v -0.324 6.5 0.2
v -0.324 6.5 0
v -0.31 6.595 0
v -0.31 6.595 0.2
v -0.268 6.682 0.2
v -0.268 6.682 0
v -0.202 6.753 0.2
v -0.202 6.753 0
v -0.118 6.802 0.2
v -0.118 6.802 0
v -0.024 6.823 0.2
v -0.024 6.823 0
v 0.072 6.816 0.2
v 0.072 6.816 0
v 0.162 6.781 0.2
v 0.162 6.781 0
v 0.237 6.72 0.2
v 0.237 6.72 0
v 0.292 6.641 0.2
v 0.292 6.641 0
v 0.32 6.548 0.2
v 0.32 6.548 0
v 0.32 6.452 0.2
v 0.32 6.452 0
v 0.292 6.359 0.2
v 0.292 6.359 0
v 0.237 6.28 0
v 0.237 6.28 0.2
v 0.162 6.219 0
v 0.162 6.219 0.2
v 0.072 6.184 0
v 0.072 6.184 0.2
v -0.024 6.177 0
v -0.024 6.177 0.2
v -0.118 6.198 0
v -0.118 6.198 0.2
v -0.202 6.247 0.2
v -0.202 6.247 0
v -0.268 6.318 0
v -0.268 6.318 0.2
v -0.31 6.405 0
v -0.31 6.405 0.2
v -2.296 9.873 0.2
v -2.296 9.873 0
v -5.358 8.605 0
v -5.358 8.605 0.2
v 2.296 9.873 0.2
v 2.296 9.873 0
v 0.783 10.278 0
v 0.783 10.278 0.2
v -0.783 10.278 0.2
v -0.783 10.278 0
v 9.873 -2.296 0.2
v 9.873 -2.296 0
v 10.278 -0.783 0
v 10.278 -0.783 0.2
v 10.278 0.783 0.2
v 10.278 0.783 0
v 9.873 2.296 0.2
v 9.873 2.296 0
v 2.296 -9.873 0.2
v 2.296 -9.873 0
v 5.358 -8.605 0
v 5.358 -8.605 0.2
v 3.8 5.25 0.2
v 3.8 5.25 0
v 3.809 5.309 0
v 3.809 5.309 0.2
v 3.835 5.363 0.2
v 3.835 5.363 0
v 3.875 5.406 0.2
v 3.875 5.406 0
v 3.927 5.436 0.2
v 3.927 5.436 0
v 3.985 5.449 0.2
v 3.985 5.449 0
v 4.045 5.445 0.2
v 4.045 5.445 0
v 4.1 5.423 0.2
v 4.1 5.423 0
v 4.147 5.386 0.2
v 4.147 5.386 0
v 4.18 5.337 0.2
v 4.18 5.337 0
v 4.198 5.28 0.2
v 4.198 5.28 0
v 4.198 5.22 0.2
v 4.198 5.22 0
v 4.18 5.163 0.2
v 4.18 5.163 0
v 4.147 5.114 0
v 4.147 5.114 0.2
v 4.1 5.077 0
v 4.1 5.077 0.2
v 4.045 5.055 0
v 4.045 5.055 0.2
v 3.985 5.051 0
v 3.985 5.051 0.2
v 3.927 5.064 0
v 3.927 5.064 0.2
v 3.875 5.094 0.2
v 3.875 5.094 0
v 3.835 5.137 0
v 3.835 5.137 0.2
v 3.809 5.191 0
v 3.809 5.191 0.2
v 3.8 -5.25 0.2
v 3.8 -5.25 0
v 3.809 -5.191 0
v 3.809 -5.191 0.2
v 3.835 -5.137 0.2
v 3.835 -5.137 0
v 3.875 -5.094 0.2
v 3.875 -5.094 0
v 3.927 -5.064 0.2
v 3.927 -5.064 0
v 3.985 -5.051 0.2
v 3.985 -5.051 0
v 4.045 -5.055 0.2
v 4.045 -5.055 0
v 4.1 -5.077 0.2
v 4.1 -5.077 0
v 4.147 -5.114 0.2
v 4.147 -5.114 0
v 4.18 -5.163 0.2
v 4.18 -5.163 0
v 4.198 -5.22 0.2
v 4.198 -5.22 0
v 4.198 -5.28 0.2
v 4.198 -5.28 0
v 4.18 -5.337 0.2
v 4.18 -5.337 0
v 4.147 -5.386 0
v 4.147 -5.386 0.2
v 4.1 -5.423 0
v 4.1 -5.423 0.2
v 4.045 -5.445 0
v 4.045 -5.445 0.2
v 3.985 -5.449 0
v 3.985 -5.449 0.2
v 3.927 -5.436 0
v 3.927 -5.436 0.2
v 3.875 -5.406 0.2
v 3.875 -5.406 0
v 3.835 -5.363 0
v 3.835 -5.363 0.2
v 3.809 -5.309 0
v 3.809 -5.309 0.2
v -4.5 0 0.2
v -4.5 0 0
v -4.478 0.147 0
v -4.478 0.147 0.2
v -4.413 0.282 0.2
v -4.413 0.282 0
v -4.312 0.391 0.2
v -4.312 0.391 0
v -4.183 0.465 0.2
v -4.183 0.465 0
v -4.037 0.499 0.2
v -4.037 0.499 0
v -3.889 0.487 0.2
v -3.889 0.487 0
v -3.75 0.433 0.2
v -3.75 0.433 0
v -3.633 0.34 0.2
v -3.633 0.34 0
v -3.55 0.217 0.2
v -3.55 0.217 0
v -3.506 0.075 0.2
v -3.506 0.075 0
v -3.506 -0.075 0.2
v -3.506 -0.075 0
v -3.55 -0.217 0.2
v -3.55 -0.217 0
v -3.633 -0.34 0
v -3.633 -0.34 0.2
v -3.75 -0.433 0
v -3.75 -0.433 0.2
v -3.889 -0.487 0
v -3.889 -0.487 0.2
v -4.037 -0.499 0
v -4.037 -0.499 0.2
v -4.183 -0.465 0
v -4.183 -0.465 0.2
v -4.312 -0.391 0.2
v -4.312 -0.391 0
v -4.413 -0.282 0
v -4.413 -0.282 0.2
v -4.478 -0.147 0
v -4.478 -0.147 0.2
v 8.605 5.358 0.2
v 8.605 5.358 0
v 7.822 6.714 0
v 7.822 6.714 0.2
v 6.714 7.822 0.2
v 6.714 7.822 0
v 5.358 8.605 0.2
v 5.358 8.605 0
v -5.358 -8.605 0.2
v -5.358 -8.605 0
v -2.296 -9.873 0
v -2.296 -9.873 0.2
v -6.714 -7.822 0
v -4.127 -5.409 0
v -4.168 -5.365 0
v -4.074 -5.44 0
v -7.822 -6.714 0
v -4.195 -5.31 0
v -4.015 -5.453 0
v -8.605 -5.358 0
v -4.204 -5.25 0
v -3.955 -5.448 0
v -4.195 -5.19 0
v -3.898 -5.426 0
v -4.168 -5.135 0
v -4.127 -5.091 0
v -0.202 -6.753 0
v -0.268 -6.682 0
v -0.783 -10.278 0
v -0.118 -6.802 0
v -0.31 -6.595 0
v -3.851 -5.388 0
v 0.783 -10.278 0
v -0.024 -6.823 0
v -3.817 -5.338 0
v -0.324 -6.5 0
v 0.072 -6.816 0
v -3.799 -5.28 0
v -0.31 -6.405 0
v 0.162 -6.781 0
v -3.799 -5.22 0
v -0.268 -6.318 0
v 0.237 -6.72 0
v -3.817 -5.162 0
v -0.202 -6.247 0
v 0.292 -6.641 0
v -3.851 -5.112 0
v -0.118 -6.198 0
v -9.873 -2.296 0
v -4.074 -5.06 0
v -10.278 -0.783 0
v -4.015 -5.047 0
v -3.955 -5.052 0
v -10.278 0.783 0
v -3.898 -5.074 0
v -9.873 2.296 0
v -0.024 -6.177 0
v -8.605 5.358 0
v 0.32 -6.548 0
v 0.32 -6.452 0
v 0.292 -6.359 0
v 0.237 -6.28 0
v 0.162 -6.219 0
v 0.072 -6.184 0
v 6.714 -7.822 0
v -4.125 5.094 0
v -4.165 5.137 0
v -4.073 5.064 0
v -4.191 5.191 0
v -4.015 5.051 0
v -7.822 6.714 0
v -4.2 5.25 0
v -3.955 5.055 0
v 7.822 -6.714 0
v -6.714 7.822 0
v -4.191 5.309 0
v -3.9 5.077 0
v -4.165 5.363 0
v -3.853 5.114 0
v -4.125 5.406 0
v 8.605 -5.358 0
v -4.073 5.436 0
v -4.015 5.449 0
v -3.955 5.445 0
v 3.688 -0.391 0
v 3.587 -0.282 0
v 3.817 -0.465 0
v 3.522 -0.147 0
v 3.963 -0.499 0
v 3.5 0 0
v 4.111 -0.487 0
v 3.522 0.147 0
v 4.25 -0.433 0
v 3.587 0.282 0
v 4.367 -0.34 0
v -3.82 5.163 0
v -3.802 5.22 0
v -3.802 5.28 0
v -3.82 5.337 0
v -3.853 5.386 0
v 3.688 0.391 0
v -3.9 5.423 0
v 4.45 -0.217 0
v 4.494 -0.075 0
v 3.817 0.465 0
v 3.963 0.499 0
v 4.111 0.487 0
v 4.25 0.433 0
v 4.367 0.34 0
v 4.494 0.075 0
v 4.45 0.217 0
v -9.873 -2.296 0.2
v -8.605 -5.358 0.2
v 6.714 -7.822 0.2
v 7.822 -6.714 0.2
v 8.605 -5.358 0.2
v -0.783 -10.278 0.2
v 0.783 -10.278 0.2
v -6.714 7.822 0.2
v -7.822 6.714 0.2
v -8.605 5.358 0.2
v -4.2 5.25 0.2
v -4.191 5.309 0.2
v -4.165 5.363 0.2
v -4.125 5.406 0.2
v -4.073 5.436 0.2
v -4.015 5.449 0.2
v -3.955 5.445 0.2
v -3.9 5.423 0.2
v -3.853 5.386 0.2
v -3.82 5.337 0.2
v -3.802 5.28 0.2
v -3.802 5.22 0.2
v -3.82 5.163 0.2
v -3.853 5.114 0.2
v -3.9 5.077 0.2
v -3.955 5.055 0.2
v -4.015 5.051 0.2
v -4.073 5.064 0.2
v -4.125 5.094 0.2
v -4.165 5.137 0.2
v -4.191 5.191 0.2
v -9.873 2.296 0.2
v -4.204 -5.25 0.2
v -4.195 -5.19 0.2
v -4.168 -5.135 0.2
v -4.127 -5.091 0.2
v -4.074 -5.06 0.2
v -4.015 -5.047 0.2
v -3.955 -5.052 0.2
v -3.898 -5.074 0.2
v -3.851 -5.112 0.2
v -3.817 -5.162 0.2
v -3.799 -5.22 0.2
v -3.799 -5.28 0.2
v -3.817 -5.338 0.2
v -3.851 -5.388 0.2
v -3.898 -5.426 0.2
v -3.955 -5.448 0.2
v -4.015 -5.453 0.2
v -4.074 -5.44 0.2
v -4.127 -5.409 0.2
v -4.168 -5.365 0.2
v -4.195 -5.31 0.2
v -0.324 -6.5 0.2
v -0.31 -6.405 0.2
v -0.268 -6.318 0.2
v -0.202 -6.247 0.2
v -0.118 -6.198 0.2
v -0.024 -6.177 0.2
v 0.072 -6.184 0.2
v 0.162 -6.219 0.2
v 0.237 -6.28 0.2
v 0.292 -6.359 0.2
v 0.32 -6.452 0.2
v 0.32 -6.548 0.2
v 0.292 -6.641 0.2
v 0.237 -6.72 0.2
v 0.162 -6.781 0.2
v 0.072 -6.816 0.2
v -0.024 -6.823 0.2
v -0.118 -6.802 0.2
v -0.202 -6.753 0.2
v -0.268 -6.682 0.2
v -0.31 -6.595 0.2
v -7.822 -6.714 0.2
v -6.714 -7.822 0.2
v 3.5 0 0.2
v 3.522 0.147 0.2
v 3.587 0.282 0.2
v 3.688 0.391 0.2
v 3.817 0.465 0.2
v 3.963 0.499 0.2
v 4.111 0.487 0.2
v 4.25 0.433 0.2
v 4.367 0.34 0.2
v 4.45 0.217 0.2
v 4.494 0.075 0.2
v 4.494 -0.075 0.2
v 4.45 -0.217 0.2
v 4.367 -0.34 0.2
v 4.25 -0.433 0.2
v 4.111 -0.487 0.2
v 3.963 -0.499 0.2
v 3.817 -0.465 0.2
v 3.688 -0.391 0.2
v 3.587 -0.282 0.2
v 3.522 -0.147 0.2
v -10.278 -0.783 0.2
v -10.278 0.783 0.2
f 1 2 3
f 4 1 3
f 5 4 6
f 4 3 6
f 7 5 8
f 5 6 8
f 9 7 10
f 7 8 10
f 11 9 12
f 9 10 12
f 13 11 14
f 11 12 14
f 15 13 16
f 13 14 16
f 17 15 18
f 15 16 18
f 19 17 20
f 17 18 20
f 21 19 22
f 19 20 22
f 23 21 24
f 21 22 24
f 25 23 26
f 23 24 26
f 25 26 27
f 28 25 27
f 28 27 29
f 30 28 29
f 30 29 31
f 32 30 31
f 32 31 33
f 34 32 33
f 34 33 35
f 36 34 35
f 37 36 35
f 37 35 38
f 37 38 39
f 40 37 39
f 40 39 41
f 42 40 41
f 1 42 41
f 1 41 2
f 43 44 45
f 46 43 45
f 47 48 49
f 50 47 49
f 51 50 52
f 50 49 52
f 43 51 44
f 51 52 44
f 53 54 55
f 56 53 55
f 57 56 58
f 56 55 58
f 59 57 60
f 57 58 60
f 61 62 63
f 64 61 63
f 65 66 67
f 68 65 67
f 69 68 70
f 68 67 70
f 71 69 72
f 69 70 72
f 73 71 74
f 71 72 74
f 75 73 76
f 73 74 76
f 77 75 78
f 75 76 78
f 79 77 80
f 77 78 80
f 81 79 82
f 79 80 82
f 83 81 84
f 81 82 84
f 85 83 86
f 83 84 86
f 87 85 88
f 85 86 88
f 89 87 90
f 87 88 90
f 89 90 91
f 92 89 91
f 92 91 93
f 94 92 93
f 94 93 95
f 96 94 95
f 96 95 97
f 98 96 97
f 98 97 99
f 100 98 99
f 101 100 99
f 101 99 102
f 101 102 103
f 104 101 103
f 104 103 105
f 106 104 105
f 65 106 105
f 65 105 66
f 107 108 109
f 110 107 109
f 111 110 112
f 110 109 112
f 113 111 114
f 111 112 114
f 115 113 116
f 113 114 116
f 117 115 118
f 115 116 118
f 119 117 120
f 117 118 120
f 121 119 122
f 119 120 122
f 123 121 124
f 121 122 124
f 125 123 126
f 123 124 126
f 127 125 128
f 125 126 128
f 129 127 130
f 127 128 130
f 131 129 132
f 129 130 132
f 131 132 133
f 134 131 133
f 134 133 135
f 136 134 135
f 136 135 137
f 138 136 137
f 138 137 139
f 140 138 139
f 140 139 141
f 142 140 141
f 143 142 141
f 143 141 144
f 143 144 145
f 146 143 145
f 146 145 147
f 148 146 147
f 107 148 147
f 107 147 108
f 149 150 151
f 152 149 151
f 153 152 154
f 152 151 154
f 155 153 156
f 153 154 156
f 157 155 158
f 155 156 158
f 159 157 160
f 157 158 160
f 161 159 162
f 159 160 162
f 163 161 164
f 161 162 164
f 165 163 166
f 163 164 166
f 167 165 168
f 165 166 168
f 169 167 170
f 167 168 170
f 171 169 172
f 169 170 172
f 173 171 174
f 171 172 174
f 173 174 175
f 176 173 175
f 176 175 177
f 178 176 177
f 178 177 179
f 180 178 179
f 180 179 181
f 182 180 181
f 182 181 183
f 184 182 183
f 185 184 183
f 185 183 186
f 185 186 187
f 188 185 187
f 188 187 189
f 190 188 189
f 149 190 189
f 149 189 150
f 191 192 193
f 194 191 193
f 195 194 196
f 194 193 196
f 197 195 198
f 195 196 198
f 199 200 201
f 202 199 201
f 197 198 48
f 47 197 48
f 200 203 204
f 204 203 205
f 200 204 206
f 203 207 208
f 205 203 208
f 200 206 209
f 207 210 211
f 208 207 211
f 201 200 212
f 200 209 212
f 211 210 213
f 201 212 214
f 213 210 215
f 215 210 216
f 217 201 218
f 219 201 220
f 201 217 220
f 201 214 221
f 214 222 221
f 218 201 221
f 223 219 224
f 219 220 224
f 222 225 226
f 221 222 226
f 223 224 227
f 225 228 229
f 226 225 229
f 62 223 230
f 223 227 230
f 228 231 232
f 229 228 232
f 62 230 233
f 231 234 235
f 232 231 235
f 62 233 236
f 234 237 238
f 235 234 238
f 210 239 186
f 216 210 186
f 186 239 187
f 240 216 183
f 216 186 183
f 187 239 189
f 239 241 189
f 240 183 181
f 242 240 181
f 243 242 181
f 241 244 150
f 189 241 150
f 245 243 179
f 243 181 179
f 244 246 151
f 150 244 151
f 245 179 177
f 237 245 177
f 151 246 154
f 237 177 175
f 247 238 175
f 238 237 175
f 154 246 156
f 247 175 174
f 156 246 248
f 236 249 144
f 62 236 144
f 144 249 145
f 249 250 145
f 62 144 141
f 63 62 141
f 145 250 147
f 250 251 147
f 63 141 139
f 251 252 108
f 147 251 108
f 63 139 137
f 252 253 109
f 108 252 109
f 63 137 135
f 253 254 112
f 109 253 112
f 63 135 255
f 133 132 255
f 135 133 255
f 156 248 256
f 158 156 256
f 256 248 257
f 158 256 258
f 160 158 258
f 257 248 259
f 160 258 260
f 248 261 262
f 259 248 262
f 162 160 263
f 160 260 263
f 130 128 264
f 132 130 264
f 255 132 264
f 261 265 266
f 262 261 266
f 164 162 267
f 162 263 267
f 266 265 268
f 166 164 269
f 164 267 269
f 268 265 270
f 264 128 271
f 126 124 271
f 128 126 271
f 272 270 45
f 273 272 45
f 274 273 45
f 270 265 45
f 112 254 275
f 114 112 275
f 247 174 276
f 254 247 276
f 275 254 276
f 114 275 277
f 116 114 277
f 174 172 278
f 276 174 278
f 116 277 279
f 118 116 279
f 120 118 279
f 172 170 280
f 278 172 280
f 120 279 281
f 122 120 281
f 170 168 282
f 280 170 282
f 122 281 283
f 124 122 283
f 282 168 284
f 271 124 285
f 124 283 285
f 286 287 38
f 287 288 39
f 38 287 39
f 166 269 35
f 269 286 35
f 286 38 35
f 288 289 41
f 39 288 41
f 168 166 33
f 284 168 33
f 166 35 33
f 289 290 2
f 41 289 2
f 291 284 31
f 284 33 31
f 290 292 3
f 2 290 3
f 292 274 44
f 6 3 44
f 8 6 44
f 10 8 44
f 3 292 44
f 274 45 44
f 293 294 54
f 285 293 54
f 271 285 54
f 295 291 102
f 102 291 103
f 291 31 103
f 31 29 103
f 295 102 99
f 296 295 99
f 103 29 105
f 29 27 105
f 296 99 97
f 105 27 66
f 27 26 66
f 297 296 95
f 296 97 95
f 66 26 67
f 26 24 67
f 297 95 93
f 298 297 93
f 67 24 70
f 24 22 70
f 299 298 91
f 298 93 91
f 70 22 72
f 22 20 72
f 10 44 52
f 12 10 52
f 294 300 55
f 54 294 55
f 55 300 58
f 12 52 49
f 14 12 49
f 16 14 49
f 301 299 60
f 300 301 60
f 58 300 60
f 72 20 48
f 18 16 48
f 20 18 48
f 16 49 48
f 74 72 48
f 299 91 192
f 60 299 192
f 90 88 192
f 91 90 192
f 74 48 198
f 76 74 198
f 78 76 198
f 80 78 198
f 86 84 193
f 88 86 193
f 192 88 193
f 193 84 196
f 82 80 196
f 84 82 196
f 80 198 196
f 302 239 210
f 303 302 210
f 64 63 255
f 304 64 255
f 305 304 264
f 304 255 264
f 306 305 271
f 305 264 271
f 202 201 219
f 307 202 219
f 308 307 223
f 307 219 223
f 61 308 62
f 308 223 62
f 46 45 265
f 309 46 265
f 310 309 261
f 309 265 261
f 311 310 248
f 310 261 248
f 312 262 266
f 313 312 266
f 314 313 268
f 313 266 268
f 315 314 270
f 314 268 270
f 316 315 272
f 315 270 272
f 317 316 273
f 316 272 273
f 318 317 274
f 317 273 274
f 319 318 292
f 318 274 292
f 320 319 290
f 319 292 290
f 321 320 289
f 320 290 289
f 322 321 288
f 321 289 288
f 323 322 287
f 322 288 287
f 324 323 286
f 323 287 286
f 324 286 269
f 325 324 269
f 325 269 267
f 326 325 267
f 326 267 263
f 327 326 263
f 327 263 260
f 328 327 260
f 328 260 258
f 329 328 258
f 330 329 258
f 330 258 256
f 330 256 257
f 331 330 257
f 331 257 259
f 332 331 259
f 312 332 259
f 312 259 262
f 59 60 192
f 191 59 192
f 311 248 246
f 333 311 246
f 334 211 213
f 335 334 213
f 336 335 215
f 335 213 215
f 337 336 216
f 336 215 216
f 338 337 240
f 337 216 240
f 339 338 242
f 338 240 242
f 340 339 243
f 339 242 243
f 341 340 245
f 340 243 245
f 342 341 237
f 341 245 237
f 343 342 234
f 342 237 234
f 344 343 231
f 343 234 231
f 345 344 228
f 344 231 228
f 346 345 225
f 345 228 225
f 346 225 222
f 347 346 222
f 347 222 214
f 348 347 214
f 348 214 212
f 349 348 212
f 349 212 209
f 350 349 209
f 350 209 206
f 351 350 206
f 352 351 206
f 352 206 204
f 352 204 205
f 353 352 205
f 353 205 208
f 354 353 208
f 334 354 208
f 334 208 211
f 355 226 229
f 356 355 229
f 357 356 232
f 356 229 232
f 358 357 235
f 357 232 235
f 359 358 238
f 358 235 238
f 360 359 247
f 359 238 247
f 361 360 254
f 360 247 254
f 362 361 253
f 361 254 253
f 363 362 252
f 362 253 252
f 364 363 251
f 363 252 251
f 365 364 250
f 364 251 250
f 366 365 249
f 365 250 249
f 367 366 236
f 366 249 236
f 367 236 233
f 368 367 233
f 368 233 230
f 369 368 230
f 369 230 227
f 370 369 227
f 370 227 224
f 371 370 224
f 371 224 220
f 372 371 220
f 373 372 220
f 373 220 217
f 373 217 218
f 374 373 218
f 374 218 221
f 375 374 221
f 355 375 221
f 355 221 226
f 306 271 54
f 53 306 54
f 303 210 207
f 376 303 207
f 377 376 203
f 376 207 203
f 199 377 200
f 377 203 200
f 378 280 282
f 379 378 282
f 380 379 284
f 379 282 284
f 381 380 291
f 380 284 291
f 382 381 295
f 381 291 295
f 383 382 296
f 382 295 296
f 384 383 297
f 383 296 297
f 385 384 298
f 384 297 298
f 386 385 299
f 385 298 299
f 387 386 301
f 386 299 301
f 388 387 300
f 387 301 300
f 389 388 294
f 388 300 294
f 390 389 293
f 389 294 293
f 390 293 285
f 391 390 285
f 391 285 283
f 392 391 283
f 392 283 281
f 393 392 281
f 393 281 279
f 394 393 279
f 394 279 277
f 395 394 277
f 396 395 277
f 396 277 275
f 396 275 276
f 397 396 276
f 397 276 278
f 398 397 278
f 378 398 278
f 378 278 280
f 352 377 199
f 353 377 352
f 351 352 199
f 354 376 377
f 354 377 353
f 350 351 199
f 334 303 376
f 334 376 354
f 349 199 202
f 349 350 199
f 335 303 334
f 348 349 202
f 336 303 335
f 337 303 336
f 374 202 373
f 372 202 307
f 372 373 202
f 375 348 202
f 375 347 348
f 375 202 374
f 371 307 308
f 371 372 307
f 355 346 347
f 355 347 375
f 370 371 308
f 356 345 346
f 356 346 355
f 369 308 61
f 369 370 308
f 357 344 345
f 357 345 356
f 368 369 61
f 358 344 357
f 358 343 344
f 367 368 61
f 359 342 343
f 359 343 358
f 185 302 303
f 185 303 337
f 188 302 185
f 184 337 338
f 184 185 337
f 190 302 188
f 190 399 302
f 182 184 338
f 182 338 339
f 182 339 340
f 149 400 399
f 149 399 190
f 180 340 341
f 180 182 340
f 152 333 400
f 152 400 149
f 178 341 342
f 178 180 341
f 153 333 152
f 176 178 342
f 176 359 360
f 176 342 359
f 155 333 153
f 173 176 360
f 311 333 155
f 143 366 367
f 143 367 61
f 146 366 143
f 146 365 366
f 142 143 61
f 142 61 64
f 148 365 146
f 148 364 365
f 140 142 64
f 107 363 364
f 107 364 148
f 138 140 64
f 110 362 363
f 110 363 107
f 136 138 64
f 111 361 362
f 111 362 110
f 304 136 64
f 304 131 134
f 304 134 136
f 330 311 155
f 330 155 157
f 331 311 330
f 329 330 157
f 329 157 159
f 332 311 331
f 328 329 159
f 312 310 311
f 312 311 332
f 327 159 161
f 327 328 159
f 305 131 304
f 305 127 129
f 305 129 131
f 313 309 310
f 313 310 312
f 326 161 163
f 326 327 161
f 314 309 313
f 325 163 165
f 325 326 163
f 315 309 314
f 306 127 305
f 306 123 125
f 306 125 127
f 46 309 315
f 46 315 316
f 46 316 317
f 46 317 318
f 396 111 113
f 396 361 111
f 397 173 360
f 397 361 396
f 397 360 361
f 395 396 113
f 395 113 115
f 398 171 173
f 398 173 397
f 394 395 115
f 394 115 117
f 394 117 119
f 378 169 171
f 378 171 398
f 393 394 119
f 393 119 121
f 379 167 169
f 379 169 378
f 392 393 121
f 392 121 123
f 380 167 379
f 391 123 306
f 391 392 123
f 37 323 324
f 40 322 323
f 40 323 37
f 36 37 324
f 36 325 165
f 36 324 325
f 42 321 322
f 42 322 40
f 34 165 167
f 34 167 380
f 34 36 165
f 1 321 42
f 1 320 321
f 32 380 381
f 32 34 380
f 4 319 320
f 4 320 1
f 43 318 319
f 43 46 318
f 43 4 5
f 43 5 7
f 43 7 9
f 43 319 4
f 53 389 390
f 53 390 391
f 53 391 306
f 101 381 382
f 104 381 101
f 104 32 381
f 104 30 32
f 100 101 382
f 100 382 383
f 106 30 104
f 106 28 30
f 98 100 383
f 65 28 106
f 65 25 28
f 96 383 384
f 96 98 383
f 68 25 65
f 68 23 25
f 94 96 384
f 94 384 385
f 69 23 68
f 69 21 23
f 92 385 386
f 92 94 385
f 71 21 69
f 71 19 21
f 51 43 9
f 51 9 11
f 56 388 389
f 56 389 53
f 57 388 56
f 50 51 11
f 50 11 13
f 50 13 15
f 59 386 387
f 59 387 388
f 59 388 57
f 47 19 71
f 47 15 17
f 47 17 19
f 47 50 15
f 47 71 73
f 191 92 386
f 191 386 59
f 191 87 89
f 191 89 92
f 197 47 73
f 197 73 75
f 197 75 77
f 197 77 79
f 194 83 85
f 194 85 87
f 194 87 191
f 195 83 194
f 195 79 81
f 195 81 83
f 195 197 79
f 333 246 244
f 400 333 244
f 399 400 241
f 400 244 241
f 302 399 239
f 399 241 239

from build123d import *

# Parameters (mm, degrees)
BOSS_EXTRUDE1_DEPTH = 0.2
SKETCH2_R           = 0.323929716
SKETCH2_R_2         = 0.2
SKETCH2_R_3         = 0.203589937
SKETCH2_R_4         = 0.5
CUT_EXTRUDE1_DEPTH  = 1.2


with BuildPart() as part:
    # Sketch1 → Boss-Extrude1 (new body)
    with BuildSketch(Plane.XY):
        with BuildLine():
            Line((-2.296100594, 9.872845996), (-5.357568053, 8.604744654))
            ThreePointArc((-5.357568053, 8.604744654), (-7.304108146, 7.304108146), (-8.604744654, 5.357568053))
            Line((-8.604744654, 5.357568053), (-9.872845996, 2.296100594))
            ThreePointArc((-9.872845996, 2.296100594), (-10.329568801, 0), (-9.872845996, -2.296100594))
            Line((-9.872845996, -2.296100594), (-8.604744654, -5.357568053))
            ThreePointArc((-8.604744654, -5.357568053), (-7.304108146, -7.304108146), (-5.357568053, -8.604744654))
            Line((-5.357568053, -8.604744654), (-2.296100594, -9.872845996))
            ThreePointArc((-2.296100594, -9.872845996), (0, -10.329568801), (2.296100594, -9.872845996))
            Line((2.296100594, -9.872845996), (5.357568053, -8.604744654))
            ThreePointArc((5.357568053, -8.604744654), (7.304108146, -7.304108146), (8.604744654, -5.357568053))
            Line((8.604744654, -5.357568053), (9.872845996, -2.296100594))
            ThreePointArc((9.872845996, -2.296100594), (10.329568801, 0), (9.872845996, 2.296100594))
            Line((9.872845996, 2.296100594), (8.604744654, 5.357568053))
            ThreePointArc((8.604744654, 5.357568053), (7.304108146, 7.304108146), (5.357568053, 8.604744654))
            Line((5.357568053, 8.604744654), (2.296100594, 9.872845996))
            ThreePointArc((2.296100594, 9.872845996), (0, 10.329568801), (-2.296100594, 9.872845996))
        make_face()
    extrude(amount=BOSS_EXTRUDE1_DEPTH)

    # Sketch2 → Cut-Extrude1 (cut, through all)
    with BuildSketch(Plane(origin=(0, 0, 0), x_dir=(-1, 0, 0), z_dir=(0, 0, -1))):
        with Locations((0, -6.5)):
            Circle(SKETCH2_R)
        with Locations((-4, -5.25)):
            Circle(SKETCH2_R_2)
        with Locations((4, -5.25)):
            Circle(SKETCH2_R_3)
        with Locations((4, 5.25)):
            Circle(SKETCH2_R_2)
        with Locations((0, 6.5)):
            Circle(SKETCH2_R)
        with Locations((-4, 5.25)):
            Circle(SKETCH2_R_2)
        with Locations((4, 0)):
            Circle(SKETCH2_R_4)
        with Locations((-4, 0)):
            Circle(SKETCH2_R_4)
    extrude(amount=-CUT_EXTRUDE1_DEPTH, mode=Mode.SUBTRACT)


solid = part.part
